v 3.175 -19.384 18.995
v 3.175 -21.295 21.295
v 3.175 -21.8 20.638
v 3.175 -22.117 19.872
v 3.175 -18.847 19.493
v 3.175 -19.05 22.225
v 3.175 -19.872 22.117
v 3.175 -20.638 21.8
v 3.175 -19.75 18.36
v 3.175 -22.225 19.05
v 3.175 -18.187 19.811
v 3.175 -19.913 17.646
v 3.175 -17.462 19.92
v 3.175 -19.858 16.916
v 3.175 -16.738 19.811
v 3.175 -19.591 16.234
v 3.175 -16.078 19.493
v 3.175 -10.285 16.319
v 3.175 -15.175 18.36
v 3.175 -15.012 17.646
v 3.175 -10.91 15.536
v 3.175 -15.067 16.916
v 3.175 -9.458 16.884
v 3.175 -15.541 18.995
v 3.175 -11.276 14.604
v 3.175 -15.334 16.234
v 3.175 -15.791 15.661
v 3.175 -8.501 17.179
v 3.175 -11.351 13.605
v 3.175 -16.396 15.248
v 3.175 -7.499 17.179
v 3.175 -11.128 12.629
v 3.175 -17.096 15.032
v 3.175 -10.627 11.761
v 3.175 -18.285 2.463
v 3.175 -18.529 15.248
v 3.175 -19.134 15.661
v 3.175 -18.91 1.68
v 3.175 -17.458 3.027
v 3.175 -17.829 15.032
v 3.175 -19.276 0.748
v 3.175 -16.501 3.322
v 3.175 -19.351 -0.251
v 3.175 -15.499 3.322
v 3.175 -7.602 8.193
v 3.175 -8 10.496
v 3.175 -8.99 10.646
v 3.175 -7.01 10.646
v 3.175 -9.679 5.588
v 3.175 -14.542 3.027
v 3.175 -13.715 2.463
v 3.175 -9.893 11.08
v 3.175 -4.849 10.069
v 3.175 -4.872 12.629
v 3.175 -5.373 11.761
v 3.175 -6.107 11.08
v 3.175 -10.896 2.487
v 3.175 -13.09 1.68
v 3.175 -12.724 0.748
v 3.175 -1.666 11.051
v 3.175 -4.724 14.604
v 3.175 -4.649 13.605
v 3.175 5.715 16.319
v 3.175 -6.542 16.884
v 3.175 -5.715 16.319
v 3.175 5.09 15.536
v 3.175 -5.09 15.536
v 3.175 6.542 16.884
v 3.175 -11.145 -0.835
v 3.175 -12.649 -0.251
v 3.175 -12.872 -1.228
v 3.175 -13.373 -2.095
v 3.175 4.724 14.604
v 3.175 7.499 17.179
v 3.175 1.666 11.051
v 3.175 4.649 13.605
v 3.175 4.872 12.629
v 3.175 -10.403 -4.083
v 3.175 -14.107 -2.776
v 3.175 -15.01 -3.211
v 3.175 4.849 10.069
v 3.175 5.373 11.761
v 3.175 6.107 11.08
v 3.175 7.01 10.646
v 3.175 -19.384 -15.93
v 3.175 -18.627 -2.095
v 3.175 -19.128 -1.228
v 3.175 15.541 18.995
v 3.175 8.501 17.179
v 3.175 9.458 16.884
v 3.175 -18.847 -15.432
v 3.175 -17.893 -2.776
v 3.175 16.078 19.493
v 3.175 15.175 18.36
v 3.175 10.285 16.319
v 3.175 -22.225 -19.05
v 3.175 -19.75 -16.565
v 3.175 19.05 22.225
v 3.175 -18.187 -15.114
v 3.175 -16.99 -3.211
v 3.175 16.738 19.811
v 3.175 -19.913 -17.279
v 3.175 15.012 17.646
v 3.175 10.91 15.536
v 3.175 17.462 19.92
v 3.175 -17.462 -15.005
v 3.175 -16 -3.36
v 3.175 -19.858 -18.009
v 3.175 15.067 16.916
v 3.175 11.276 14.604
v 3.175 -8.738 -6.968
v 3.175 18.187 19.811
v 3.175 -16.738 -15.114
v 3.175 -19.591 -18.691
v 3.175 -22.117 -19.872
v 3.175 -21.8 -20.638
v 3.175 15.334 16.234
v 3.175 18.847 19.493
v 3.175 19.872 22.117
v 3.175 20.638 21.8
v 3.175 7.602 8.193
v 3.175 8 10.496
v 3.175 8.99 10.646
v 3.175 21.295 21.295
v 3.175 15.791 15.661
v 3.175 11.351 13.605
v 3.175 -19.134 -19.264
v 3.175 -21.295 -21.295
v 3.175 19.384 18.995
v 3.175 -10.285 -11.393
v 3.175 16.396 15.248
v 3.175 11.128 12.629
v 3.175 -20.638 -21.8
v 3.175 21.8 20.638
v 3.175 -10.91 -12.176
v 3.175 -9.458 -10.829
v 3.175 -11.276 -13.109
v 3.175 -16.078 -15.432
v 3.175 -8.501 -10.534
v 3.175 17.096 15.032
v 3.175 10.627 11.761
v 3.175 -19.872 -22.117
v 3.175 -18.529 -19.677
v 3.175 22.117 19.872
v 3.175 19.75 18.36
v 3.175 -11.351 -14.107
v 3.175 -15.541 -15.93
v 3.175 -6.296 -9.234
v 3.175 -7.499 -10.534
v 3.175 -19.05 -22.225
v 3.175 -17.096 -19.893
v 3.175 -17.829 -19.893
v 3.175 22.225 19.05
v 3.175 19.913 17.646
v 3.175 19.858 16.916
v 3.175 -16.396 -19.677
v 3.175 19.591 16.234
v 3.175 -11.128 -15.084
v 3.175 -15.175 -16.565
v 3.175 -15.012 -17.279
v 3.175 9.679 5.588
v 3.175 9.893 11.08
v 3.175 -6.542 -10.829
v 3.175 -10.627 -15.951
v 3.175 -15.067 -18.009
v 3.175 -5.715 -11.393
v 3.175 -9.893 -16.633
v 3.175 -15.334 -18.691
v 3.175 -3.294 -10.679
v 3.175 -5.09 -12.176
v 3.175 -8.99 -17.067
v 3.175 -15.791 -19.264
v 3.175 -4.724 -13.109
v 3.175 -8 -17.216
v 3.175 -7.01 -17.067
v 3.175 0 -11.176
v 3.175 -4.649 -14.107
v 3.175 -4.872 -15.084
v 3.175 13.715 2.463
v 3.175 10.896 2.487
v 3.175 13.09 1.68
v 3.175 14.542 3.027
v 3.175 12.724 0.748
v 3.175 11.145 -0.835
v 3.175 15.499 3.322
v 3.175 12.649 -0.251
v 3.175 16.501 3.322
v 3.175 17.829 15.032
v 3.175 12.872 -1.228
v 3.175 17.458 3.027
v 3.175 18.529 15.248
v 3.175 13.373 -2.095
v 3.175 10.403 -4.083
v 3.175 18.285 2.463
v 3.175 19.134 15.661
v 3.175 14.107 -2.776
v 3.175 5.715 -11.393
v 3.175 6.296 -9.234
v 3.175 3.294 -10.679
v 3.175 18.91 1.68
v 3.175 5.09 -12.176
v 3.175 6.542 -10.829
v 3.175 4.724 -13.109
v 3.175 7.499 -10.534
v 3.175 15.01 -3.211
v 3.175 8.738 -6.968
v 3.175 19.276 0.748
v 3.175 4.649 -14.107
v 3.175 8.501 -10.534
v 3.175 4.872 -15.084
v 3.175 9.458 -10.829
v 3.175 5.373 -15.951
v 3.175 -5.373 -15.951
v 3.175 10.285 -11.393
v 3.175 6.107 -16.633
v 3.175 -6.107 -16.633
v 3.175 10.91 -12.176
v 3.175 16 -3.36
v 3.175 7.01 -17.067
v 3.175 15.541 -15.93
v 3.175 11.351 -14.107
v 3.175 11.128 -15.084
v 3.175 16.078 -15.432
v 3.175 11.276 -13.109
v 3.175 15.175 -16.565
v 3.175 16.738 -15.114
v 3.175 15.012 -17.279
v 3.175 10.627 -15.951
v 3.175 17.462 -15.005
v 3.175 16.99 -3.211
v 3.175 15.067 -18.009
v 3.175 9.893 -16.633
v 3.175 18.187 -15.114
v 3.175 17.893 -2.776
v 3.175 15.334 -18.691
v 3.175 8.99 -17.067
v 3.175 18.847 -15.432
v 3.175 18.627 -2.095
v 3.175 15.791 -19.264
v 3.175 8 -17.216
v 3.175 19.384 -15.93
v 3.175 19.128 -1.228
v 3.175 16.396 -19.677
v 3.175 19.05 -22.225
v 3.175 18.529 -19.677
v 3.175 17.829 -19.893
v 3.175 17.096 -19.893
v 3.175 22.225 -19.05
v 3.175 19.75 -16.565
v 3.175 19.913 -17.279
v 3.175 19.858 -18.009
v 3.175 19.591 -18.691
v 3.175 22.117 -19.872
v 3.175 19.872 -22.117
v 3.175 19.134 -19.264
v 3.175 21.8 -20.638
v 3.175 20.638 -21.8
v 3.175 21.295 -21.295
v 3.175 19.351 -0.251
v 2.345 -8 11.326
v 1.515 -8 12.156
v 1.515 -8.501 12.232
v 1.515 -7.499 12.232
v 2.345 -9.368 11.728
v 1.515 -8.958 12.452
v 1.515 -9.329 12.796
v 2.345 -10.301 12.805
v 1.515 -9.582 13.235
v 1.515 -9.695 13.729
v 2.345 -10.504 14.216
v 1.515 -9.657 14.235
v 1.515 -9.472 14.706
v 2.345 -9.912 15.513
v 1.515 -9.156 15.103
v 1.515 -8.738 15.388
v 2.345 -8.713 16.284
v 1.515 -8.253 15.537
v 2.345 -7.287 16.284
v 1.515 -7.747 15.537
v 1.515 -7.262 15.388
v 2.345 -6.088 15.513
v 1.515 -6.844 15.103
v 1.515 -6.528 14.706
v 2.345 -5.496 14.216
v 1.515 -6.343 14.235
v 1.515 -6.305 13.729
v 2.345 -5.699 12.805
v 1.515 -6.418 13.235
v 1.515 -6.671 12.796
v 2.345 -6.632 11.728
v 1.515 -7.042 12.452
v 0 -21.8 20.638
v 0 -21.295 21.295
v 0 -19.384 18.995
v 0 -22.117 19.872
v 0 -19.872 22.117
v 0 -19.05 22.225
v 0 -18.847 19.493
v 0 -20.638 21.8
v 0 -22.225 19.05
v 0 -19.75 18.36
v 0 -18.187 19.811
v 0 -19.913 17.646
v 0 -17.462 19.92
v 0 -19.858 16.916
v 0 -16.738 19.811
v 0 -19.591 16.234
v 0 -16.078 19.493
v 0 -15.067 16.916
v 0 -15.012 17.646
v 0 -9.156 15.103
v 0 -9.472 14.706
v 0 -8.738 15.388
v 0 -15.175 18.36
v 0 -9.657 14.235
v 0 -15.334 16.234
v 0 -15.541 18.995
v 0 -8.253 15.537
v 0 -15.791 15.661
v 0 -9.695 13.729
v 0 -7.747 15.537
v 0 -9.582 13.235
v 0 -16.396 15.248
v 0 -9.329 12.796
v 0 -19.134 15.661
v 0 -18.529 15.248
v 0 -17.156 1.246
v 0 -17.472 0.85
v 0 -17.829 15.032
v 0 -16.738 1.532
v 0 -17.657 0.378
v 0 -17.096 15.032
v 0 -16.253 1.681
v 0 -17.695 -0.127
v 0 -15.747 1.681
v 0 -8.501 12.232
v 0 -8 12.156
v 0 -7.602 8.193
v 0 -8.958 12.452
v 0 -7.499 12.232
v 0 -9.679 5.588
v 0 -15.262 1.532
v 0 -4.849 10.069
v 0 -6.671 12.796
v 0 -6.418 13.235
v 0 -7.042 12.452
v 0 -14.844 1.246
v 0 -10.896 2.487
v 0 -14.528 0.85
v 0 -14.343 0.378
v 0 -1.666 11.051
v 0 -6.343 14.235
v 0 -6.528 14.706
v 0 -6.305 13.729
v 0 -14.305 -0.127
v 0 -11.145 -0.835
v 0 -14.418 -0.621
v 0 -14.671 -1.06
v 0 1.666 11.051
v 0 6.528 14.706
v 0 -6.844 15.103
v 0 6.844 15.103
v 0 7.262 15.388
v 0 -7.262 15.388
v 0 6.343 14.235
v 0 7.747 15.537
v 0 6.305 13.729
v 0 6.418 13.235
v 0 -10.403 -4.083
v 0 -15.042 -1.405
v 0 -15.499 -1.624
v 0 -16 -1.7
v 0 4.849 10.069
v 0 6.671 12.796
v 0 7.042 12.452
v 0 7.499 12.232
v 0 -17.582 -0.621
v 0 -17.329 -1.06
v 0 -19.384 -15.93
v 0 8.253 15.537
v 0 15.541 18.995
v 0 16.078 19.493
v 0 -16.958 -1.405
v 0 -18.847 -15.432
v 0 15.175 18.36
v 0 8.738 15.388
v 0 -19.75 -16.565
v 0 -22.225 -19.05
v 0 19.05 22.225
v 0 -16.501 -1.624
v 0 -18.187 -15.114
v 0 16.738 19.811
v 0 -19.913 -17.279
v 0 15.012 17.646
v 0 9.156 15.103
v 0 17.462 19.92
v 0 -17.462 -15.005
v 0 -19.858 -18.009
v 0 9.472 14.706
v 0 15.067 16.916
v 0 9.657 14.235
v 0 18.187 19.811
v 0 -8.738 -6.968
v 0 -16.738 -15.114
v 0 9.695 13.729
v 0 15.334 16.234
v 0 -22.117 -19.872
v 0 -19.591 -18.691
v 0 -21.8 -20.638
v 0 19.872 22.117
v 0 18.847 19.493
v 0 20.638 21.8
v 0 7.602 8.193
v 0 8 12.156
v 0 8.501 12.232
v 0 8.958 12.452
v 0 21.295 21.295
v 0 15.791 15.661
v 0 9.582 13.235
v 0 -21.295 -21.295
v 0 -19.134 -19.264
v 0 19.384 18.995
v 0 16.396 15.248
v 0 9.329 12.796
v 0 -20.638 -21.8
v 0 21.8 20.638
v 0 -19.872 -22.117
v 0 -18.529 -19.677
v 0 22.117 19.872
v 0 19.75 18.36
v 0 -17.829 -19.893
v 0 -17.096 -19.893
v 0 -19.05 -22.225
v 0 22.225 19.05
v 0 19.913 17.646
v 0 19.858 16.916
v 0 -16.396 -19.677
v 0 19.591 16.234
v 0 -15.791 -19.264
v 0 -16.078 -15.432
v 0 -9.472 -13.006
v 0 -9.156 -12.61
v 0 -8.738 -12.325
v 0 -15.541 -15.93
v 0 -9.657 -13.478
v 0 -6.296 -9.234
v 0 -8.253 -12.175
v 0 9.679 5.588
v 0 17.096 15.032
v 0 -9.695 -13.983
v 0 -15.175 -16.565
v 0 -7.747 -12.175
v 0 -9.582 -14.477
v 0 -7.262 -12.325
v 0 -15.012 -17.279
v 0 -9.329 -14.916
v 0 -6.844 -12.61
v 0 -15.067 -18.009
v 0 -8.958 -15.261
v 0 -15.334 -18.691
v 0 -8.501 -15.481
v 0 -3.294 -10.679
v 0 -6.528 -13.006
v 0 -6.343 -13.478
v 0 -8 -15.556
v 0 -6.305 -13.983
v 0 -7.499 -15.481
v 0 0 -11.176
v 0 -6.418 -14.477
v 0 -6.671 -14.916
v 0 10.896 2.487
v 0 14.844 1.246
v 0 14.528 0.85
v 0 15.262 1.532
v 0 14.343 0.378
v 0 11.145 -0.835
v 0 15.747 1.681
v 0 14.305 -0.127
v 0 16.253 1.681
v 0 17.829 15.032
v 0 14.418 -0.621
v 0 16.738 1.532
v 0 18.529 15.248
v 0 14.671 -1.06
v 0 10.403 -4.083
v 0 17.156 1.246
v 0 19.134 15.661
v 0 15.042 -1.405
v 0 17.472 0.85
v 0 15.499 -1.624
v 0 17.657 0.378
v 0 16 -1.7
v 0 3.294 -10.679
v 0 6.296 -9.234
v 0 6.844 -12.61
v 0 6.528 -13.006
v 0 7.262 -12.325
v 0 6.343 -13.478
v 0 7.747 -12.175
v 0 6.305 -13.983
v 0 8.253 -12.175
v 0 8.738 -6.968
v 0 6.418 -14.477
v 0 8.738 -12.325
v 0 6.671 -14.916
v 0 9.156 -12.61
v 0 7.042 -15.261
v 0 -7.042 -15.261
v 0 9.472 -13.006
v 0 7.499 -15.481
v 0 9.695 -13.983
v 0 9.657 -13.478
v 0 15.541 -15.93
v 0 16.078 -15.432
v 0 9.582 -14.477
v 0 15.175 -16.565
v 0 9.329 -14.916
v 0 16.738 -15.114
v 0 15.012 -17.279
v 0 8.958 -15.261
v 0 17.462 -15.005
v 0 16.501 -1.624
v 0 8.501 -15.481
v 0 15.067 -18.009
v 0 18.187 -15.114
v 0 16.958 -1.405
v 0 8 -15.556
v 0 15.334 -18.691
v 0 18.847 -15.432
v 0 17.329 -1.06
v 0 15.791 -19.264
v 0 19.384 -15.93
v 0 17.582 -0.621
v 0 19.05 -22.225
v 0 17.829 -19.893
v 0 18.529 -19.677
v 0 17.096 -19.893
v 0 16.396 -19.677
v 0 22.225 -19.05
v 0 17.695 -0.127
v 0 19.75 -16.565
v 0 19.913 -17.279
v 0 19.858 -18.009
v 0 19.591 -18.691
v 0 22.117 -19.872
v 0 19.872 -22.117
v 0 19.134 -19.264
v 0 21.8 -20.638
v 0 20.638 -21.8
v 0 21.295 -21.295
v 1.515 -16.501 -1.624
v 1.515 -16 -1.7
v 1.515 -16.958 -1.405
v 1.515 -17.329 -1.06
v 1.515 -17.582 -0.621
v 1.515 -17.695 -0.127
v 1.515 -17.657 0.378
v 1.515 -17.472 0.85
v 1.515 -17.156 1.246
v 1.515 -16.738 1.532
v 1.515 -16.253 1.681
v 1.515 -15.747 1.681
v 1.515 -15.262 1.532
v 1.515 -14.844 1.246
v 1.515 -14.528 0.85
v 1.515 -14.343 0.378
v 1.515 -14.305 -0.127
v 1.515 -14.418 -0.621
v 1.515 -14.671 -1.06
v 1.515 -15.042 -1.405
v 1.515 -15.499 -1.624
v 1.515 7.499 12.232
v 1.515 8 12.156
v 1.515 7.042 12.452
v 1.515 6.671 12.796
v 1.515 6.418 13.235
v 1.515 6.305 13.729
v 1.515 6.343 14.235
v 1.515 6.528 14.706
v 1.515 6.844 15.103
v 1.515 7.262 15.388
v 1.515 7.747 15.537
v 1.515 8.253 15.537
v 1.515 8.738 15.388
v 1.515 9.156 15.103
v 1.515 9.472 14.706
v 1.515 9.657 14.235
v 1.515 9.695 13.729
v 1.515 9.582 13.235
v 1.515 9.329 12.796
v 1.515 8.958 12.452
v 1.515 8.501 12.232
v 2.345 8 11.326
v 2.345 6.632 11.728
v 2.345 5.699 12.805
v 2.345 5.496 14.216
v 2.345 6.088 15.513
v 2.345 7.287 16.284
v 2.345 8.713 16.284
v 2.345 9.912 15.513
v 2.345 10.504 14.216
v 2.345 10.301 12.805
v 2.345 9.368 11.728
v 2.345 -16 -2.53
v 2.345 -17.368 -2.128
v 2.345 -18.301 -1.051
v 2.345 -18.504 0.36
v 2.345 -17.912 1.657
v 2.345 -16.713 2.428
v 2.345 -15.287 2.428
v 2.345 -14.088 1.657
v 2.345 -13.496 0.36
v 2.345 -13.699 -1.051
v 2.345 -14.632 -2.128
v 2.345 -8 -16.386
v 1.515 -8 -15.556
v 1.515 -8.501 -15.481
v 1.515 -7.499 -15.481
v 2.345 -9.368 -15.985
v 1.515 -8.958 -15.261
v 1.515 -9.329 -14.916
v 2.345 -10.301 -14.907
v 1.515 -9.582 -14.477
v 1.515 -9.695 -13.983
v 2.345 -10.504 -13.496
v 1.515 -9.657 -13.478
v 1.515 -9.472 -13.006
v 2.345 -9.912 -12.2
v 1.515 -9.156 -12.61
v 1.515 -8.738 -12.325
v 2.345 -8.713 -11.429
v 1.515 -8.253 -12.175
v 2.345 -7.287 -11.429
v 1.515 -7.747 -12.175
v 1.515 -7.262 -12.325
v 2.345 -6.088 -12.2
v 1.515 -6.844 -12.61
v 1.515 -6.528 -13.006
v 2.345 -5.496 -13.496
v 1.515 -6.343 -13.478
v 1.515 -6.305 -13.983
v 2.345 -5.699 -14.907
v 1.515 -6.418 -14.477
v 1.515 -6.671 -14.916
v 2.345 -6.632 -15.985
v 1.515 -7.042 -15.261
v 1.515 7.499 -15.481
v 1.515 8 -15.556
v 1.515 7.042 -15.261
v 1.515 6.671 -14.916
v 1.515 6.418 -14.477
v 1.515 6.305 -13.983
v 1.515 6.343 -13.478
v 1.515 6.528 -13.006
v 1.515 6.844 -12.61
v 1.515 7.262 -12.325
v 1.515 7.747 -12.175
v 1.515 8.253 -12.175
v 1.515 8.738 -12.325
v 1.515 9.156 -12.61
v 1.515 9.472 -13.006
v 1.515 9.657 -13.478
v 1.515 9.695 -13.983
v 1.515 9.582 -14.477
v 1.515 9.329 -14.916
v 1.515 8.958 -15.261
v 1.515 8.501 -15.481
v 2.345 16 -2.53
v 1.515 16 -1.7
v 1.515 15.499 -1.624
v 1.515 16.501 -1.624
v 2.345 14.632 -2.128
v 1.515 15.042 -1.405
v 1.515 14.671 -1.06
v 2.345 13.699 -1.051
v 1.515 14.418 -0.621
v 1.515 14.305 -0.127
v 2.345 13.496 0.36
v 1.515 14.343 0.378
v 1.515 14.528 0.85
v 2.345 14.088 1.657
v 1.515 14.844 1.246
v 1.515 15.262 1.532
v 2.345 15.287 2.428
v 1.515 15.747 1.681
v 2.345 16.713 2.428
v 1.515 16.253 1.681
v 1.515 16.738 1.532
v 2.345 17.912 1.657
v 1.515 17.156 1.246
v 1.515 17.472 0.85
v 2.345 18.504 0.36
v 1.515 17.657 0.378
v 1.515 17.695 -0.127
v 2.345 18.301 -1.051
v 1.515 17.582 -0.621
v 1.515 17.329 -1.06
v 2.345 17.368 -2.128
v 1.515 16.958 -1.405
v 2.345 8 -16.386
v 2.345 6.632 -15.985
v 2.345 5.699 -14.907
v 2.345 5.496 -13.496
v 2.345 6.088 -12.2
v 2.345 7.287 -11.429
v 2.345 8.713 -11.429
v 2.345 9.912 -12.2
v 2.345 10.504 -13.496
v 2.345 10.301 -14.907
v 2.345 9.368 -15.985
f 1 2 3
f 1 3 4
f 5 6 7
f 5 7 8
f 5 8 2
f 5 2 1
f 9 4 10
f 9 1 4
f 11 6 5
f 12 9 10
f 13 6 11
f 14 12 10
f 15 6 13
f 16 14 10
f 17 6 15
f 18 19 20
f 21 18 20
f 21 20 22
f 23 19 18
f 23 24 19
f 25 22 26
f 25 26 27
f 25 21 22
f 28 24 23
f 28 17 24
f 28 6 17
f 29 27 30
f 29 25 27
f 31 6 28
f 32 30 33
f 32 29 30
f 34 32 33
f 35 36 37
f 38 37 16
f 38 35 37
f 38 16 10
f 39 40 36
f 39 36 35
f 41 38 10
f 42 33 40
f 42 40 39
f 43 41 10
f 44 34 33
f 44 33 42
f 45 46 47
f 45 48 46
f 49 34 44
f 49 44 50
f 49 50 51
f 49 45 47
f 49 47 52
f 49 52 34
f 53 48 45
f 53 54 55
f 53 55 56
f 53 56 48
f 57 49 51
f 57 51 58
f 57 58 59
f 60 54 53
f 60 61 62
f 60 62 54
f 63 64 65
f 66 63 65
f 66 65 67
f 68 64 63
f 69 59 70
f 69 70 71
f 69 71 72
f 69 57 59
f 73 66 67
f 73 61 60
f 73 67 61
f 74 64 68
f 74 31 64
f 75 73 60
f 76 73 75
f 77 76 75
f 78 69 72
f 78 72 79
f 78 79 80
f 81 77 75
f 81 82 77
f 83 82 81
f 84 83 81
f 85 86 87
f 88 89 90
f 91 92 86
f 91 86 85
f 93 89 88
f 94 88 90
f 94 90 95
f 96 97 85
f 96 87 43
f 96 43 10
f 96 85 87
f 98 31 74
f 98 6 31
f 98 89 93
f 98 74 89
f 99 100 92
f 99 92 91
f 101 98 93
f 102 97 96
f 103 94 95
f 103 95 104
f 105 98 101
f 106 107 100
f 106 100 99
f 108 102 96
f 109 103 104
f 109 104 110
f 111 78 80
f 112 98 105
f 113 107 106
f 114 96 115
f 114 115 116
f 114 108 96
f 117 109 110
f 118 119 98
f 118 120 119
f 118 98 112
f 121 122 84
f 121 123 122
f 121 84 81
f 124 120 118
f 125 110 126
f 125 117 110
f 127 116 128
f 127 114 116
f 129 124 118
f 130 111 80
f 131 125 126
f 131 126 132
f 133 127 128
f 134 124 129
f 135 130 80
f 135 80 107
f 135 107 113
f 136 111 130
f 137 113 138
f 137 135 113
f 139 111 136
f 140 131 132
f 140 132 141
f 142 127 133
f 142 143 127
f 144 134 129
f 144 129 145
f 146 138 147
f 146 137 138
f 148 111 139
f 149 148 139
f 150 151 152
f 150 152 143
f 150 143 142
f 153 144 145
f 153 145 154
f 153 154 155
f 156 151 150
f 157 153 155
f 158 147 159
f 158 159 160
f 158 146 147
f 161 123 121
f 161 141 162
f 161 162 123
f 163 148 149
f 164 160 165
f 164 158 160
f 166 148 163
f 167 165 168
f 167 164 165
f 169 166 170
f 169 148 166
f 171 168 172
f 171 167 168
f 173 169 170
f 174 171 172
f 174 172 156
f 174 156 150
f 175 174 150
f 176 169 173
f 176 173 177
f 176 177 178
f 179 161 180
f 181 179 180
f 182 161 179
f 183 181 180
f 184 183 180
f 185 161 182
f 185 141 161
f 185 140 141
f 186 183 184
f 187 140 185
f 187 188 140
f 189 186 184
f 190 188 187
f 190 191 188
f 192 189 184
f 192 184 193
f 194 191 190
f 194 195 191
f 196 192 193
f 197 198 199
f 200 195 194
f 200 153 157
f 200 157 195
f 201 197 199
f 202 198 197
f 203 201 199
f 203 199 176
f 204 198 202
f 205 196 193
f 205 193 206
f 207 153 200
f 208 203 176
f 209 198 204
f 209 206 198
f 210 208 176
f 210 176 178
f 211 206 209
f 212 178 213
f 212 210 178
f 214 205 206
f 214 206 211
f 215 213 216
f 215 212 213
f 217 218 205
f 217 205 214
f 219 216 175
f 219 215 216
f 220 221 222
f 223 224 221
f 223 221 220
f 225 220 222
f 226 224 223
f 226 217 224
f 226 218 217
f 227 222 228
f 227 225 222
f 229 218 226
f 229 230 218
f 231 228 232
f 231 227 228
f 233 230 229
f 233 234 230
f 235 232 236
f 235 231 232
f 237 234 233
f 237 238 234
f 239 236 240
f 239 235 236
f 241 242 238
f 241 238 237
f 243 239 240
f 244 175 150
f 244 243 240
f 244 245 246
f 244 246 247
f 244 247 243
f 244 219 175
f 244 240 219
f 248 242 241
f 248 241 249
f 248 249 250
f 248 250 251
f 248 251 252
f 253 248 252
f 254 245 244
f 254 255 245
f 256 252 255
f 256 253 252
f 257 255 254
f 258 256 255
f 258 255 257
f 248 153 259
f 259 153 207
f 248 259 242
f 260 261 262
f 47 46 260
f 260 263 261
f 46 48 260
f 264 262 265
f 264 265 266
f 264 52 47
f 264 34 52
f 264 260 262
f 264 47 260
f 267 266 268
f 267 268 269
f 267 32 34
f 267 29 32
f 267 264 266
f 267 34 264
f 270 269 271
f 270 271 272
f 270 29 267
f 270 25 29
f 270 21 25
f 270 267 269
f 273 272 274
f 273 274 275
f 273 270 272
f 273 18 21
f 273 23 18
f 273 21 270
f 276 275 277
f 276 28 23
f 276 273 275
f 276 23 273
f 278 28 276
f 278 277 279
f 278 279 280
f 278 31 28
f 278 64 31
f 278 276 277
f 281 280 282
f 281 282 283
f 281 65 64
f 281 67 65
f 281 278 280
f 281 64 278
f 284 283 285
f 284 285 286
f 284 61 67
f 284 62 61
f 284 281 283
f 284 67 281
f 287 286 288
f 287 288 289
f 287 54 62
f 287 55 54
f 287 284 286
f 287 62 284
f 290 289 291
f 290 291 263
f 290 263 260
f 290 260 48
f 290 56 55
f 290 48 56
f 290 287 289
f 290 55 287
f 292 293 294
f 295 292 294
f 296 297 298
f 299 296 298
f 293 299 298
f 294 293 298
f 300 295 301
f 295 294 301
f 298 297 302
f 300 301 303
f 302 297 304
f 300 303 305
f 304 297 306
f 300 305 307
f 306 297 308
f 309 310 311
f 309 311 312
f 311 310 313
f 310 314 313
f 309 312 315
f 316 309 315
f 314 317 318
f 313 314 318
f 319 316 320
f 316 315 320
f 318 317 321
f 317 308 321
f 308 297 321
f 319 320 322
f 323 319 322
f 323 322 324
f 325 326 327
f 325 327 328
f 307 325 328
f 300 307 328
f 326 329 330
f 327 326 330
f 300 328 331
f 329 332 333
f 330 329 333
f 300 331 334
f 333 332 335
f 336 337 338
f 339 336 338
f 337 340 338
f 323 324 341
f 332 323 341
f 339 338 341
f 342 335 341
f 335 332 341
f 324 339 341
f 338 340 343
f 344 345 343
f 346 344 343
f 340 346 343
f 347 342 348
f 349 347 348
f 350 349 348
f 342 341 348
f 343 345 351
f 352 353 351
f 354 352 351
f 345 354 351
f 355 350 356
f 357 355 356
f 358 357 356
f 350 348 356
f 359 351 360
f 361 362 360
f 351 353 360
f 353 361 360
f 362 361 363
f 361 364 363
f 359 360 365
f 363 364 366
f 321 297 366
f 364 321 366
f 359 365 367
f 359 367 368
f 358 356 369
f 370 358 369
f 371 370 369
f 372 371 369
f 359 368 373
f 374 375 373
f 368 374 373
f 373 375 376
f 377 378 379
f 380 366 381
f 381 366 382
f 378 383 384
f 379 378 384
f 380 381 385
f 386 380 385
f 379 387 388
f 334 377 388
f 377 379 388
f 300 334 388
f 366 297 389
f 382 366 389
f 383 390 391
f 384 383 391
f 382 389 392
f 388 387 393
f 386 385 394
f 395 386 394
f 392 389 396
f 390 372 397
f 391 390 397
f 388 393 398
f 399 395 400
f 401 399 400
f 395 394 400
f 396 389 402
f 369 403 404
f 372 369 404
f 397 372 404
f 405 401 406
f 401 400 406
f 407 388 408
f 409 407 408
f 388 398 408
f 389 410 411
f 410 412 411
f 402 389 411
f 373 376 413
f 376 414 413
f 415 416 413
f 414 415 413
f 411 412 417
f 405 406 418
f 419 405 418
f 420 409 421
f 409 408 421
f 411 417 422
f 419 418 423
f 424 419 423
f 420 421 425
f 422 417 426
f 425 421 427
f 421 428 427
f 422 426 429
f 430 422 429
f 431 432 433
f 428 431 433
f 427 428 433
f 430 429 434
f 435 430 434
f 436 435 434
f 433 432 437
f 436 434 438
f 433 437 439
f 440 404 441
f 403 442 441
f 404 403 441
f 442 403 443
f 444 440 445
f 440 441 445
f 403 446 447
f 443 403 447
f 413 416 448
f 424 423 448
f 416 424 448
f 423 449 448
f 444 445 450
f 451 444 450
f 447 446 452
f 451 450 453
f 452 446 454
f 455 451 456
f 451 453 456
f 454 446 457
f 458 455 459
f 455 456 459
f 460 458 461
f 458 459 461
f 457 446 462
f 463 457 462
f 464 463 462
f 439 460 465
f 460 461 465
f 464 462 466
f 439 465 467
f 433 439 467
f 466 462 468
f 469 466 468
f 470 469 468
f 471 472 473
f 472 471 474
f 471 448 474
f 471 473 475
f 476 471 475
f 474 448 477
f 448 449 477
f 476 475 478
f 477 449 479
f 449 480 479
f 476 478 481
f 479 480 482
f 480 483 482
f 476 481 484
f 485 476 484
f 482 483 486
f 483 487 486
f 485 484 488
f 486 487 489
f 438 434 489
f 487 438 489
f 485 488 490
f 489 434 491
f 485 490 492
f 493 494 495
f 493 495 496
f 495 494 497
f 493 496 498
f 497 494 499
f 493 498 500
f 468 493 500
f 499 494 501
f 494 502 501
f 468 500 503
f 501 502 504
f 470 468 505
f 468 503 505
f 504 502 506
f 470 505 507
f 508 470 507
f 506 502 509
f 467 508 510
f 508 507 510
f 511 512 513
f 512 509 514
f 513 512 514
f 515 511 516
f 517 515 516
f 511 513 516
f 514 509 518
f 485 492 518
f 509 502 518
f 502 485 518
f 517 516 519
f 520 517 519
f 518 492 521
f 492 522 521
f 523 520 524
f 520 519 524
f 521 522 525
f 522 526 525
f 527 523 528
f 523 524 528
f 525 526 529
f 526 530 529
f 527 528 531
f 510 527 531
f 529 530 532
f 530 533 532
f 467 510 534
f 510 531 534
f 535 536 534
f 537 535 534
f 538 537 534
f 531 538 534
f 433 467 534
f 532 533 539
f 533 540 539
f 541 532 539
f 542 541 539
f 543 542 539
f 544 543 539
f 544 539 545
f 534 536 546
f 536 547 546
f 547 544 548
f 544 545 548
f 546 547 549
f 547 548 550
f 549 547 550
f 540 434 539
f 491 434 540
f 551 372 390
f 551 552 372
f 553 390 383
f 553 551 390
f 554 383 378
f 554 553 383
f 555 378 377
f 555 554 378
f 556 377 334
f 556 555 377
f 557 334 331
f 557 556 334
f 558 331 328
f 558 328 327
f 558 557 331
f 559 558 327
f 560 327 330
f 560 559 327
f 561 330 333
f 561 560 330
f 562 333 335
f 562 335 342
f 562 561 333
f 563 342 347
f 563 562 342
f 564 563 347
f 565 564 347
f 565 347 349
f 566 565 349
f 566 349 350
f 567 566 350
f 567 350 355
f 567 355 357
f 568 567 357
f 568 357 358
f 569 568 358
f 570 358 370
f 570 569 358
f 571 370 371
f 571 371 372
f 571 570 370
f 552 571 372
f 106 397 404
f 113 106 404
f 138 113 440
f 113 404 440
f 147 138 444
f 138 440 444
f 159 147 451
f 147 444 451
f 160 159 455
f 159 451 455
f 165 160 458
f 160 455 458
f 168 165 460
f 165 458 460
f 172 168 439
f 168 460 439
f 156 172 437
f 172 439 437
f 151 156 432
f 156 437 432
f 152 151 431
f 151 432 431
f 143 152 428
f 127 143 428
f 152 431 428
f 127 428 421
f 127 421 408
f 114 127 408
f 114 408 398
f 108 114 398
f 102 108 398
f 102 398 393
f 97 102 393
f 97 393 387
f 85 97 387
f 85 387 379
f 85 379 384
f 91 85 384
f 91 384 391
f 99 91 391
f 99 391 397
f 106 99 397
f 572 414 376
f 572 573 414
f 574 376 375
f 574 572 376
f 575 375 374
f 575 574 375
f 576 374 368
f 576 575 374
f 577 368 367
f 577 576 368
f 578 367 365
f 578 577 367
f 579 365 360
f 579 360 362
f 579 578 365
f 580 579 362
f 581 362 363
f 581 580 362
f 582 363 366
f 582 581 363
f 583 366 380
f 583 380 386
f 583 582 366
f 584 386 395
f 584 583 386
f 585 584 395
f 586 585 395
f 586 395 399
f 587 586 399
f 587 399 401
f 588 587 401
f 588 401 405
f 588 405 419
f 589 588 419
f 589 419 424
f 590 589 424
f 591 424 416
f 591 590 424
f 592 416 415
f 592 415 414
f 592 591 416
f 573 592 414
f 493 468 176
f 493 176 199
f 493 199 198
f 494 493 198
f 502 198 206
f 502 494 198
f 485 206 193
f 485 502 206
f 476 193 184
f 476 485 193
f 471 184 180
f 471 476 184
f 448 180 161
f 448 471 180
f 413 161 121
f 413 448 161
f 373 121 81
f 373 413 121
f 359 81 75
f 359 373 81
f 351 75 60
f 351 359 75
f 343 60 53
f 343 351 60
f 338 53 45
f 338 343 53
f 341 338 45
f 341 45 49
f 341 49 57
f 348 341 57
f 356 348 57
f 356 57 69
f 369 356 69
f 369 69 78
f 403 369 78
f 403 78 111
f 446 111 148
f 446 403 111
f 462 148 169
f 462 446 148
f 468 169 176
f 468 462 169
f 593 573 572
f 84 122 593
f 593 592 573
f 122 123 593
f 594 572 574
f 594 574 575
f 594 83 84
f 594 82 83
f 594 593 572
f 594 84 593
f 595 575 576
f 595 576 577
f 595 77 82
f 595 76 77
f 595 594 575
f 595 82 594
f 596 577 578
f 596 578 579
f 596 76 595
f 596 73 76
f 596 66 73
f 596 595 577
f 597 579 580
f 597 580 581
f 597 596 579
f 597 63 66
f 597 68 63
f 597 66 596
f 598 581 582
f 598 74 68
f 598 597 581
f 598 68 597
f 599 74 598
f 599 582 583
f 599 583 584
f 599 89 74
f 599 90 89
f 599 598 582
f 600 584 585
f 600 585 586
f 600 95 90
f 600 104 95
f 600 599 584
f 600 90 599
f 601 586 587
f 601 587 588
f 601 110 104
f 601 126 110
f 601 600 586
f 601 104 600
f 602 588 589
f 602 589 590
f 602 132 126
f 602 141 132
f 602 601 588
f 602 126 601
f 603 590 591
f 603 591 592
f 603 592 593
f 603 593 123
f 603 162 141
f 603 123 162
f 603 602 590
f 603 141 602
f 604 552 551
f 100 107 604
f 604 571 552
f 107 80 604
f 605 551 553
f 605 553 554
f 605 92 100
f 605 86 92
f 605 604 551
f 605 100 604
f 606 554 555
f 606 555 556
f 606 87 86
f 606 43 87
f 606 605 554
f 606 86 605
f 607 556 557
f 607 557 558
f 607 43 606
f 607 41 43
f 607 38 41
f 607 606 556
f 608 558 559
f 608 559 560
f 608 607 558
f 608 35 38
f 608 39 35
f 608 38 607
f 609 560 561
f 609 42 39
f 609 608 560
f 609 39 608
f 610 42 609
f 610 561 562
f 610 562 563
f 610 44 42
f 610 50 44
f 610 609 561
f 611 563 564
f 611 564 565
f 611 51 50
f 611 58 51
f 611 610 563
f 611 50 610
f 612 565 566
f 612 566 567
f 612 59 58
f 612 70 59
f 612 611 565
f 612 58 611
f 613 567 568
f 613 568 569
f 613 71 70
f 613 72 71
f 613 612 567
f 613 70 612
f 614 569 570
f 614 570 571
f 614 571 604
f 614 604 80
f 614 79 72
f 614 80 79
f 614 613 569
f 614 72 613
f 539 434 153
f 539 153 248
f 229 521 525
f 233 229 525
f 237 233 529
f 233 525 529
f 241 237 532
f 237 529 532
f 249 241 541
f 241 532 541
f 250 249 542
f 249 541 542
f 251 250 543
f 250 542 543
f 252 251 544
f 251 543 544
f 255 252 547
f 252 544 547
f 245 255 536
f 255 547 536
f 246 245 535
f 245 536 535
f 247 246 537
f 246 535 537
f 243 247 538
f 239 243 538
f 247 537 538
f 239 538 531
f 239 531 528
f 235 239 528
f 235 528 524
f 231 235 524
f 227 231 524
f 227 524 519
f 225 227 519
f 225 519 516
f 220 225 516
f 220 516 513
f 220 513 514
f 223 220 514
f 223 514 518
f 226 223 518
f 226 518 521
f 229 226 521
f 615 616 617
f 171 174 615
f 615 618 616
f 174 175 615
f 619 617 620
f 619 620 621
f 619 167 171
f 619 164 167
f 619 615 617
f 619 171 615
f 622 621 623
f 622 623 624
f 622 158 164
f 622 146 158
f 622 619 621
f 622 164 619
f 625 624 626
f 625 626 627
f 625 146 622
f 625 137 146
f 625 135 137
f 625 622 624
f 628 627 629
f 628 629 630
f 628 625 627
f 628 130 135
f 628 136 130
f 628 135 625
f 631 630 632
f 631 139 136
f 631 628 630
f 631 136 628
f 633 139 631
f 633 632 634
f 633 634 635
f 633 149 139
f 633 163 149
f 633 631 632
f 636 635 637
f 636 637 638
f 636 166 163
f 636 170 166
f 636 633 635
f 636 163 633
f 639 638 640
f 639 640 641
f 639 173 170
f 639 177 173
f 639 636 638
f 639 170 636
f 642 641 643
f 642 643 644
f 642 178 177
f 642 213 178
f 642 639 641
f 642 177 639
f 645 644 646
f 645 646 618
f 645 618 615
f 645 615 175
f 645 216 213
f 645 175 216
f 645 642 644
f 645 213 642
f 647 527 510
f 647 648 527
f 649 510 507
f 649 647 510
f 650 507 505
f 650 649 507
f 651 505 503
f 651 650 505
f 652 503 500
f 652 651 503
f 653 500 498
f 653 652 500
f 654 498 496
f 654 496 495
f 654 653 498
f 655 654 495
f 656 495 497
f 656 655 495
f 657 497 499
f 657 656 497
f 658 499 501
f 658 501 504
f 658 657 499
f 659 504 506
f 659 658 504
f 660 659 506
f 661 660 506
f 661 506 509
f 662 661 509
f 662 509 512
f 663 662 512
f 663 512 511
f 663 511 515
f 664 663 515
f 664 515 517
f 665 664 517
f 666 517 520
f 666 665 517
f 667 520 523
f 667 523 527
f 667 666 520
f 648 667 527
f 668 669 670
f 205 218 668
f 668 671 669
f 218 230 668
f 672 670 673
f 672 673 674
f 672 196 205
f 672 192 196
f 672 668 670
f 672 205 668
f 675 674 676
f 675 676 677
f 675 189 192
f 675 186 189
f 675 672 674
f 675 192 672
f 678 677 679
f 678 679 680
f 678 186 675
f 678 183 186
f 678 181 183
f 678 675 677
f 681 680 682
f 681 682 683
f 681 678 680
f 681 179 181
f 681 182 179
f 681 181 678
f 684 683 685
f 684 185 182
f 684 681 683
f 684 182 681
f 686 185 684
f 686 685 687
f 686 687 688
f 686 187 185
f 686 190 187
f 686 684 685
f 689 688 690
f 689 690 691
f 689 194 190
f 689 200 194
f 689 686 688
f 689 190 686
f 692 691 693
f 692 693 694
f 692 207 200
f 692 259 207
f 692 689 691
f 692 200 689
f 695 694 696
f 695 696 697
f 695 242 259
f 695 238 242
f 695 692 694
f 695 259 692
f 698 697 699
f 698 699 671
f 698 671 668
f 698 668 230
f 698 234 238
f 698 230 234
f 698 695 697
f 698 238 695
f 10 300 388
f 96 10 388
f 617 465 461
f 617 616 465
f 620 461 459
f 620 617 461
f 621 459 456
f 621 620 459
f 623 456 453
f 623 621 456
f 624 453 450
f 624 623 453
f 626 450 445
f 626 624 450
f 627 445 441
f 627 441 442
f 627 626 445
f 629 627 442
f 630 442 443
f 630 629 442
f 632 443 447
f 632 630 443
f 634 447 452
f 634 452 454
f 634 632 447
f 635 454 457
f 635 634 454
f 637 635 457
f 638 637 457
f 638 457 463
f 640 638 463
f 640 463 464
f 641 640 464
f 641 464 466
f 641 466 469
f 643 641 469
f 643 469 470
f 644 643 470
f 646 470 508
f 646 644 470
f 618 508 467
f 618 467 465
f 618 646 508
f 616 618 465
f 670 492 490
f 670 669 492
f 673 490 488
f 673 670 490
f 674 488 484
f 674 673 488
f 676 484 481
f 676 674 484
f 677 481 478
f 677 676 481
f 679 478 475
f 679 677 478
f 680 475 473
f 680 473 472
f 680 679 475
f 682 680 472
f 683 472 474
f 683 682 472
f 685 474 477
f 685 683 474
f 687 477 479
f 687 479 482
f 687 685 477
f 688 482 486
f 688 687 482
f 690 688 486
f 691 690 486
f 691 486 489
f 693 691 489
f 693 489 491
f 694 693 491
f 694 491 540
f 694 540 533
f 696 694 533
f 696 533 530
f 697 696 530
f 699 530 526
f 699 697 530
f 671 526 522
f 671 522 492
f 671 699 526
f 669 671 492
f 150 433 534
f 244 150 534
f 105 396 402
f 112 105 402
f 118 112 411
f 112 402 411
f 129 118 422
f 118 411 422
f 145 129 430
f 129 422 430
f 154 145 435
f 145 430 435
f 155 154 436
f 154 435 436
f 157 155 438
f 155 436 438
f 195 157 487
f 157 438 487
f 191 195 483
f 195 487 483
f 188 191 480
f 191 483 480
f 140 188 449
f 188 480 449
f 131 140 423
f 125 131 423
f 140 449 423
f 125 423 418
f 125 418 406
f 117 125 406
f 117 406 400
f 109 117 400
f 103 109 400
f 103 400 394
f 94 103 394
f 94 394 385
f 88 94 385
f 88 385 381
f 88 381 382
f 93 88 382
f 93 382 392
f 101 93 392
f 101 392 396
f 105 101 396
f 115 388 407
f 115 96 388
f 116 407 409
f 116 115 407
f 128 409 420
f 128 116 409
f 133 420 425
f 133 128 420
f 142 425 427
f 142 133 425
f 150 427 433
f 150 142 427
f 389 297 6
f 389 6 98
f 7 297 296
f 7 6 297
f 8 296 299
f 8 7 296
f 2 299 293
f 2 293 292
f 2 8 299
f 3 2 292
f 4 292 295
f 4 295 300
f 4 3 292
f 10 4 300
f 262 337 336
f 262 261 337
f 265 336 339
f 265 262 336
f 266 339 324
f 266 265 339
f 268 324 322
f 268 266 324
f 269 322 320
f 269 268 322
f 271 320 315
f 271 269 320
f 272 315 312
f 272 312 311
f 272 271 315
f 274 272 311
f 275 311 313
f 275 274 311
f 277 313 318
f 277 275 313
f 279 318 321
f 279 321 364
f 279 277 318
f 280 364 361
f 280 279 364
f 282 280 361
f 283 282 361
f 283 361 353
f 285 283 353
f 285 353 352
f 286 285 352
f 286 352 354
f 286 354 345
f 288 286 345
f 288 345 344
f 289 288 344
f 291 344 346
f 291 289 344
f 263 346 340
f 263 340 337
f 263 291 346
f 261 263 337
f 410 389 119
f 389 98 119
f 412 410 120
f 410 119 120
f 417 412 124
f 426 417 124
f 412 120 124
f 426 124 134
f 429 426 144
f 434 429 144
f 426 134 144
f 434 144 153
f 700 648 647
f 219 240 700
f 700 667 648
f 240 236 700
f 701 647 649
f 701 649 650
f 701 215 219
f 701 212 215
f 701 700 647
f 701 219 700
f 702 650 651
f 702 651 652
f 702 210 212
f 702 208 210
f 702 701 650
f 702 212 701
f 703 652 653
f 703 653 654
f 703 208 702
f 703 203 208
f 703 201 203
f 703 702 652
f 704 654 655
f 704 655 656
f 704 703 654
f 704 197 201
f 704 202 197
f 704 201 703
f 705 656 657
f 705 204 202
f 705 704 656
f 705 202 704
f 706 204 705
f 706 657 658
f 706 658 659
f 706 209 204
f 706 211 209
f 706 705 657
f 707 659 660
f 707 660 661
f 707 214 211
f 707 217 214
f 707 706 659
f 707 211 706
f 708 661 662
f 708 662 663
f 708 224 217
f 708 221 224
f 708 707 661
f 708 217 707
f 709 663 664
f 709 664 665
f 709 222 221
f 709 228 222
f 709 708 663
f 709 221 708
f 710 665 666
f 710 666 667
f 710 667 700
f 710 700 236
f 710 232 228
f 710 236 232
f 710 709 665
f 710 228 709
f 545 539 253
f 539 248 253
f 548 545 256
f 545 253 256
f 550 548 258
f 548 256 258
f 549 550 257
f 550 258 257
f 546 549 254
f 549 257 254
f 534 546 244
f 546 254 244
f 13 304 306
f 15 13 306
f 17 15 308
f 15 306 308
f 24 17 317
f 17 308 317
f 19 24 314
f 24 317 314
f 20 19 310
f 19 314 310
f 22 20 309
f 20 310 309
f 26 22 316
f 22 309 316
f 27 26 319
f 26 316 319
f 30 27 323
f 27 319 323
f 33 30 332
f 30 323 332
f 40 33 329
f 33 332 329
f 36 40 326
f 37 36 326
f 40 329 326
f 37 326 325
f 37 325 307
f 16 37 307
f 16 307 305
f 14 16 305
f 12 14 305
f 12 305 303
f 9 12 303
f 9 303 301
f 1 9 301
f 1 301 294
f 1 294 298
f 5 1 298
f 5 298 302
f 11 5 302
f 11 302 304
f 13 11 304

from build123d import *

# Parameters (mm, degrees)
SKETCH1_W                        = 44.45
SKETCH1_H                        = 44.45
SKETCH1_R                        = 11.176
BOSS_EXTRUDE1_DEPTH              = 3.175
F_10_0_1935_DIAMETER_HOLE1_D     = 4.9149
F_10_0_1935_DIAMETER_HOLE1_DEPTH = 3.175
CSK_FOR_M3_SFHCS1_AT_2_COUNT     = 2
CSK_FOR_M3_SFHCS1_AT_2_PITCH     = 16
CSK_FOR_M3_SFHCS1_AT_3_COUNT     = 2
CSK_FOR_M3_SFHCS1_AT_3_PITCH     = 27.712812921
CSK_FOR_M3_SFHCS1_AT_4_COUNT     = 2
CSK_FOR_M3_SFHCS1_AT_4_PITCH     = 32
CSK_FOR_M3_SFHCS1_AT_5_COUNT     = 2
CSK_FOR_M3_SFHCS1_AT_5_PITCH     = 27.712812921
CSK_FOR_M3_SFHCS1_AT_6_COUNT     = 2
CSK_FOR_M3_SFHCS1_AT_6_PITCH     = 16
FILLET1_R                        = 3.175


with BuildPart() as part:
    # Sketch1 → Boss-Extrude1 (new body)
    with BuildSketch(Plane(origin=(0, 0, 0), x_dir=(0, 0, -1), z_dir=(1, 0, 0))):
        Rectangle(SKETCH1_W, SKETCH1_H)
        Circle(SKETCH1_R, mode=Mode.SUBTRACT)
    extrude(amount=BOSS_EXTRUDE1_DEPTH)

    # #10 (0.1935) Diameter Hole1
    with Locations(Plane(origin=(3.175, 0, 0), x_dir=(0, 0, -1), z_dir=(1, 0, 0))):
        with Locations((-17.4625, 17.4625), (17.4625, 17.4625), (17.4625, -17.4625), (-17.4625, -17.4625)):
            Hole(F_10_0_1935_DIAMETER_HOLE1_D / 2, depth=F_10_0_1935_DIAMETER_HOLE1_DEPTH)

    # Sketch6 → CSK for M3 SFHCS1 (revolve, cut)
    with BuildSketch(Plane(origin=(3.175, 8, 13.856406461), x_dir=(0, 0, -1), z_dir=(0, 1, 0))):
        Polygon((0, 0), (0, 3.175), (1.7, 3.175), (1.7, 1.66), (3.36, 0), align=None)
    csk_for_m3_sfhcs1 = revolve(axis=Axis((9.525, 8, 13.856406461), (-1, 0, 0)), mode=Mode.SUBTRACT)

    # CSK for M3 SFHCS1 at 2: CSK for M3 SFHCS1 ×2
    with Locations(*[Vector(0, 0.5, -0.866025404) * (i * CSK_FOR_M3_SFHCS1_AT_2_PITCH) for i in range(1, CSK_FOR_M3_SFHCS1_AT_2_COUNT)]):
        add(csk_for_m3_sfhcs1, mode=Mode.SUBTRACT)

    # CSK for M3 SFHCS1 at 3: CSK for M3 SFHCS1 ×2
    with Locations(*[(0, 0, -i * CSK_FOR_M3_SFHCS1_AT_3_PITCH) for i in range(1, CSK_FOR_M3_SFHCS1_AT_3_COUNT)]):
        add(csk_for_m3_sfhcs1, mode=Mode.SUBTRACT)

    # CSK for M3 SFHCS1 at 4: CSK for M3 SFHCS1 ×2
    with Locations(*[Vector(0, -0.5, -0.866025404) * (i * CSK_FOR_M3_SFHCS1_AT_4_PITCH) for i in range(1, CSK_FOR_M3_SFHCS1_AT_4_COUNT)]):
        add(csk_for_m3_sfhcs1, mode=Mode.SUBTRACT)

    # CSK for M3 SFHCS1 at 5: CSK for M3 SFHCS1 ×2
    with Locations(*[Vector(0, -0.866025404, -0.5) * (i * CSK_FOR_M3_SFHCS1_AT_5_PITCH) for i in range(1, CSK_FOR_M3_SFHCS1_AT_5_COUNT)]):
        add(csk_for_m3_sfhcs1, mode=Mode.SUBTRACT)

    # CSK for M3 SFHCS1 at 6: CSK for M3 SFHCS1 ×2
    with Locations(*[(0, -i * CSK_FOR_M3_SFHCS1_AT_6_PITCH, 0) for i in range(1, CSK_FOR_M3_SFHCS1_AT_6_COUNT)]):
        add(csk_for_m3_sfhcs1, mode=Mode.SUBTRACT)

    # Fillet1
    fillet1_edges = [part.edges().sort_by_distance(p)[0] for p in [
        (1.5875, 22.225, 22.225),
        (1.5875, 22.225, -22.225),
        (1.5875, -22.225, -22.225),
        (1.5875, -22.225, 22.225),
    ]]
    fillet(fillet1_edges, radius=FILLET1_R)


solid = part.part
